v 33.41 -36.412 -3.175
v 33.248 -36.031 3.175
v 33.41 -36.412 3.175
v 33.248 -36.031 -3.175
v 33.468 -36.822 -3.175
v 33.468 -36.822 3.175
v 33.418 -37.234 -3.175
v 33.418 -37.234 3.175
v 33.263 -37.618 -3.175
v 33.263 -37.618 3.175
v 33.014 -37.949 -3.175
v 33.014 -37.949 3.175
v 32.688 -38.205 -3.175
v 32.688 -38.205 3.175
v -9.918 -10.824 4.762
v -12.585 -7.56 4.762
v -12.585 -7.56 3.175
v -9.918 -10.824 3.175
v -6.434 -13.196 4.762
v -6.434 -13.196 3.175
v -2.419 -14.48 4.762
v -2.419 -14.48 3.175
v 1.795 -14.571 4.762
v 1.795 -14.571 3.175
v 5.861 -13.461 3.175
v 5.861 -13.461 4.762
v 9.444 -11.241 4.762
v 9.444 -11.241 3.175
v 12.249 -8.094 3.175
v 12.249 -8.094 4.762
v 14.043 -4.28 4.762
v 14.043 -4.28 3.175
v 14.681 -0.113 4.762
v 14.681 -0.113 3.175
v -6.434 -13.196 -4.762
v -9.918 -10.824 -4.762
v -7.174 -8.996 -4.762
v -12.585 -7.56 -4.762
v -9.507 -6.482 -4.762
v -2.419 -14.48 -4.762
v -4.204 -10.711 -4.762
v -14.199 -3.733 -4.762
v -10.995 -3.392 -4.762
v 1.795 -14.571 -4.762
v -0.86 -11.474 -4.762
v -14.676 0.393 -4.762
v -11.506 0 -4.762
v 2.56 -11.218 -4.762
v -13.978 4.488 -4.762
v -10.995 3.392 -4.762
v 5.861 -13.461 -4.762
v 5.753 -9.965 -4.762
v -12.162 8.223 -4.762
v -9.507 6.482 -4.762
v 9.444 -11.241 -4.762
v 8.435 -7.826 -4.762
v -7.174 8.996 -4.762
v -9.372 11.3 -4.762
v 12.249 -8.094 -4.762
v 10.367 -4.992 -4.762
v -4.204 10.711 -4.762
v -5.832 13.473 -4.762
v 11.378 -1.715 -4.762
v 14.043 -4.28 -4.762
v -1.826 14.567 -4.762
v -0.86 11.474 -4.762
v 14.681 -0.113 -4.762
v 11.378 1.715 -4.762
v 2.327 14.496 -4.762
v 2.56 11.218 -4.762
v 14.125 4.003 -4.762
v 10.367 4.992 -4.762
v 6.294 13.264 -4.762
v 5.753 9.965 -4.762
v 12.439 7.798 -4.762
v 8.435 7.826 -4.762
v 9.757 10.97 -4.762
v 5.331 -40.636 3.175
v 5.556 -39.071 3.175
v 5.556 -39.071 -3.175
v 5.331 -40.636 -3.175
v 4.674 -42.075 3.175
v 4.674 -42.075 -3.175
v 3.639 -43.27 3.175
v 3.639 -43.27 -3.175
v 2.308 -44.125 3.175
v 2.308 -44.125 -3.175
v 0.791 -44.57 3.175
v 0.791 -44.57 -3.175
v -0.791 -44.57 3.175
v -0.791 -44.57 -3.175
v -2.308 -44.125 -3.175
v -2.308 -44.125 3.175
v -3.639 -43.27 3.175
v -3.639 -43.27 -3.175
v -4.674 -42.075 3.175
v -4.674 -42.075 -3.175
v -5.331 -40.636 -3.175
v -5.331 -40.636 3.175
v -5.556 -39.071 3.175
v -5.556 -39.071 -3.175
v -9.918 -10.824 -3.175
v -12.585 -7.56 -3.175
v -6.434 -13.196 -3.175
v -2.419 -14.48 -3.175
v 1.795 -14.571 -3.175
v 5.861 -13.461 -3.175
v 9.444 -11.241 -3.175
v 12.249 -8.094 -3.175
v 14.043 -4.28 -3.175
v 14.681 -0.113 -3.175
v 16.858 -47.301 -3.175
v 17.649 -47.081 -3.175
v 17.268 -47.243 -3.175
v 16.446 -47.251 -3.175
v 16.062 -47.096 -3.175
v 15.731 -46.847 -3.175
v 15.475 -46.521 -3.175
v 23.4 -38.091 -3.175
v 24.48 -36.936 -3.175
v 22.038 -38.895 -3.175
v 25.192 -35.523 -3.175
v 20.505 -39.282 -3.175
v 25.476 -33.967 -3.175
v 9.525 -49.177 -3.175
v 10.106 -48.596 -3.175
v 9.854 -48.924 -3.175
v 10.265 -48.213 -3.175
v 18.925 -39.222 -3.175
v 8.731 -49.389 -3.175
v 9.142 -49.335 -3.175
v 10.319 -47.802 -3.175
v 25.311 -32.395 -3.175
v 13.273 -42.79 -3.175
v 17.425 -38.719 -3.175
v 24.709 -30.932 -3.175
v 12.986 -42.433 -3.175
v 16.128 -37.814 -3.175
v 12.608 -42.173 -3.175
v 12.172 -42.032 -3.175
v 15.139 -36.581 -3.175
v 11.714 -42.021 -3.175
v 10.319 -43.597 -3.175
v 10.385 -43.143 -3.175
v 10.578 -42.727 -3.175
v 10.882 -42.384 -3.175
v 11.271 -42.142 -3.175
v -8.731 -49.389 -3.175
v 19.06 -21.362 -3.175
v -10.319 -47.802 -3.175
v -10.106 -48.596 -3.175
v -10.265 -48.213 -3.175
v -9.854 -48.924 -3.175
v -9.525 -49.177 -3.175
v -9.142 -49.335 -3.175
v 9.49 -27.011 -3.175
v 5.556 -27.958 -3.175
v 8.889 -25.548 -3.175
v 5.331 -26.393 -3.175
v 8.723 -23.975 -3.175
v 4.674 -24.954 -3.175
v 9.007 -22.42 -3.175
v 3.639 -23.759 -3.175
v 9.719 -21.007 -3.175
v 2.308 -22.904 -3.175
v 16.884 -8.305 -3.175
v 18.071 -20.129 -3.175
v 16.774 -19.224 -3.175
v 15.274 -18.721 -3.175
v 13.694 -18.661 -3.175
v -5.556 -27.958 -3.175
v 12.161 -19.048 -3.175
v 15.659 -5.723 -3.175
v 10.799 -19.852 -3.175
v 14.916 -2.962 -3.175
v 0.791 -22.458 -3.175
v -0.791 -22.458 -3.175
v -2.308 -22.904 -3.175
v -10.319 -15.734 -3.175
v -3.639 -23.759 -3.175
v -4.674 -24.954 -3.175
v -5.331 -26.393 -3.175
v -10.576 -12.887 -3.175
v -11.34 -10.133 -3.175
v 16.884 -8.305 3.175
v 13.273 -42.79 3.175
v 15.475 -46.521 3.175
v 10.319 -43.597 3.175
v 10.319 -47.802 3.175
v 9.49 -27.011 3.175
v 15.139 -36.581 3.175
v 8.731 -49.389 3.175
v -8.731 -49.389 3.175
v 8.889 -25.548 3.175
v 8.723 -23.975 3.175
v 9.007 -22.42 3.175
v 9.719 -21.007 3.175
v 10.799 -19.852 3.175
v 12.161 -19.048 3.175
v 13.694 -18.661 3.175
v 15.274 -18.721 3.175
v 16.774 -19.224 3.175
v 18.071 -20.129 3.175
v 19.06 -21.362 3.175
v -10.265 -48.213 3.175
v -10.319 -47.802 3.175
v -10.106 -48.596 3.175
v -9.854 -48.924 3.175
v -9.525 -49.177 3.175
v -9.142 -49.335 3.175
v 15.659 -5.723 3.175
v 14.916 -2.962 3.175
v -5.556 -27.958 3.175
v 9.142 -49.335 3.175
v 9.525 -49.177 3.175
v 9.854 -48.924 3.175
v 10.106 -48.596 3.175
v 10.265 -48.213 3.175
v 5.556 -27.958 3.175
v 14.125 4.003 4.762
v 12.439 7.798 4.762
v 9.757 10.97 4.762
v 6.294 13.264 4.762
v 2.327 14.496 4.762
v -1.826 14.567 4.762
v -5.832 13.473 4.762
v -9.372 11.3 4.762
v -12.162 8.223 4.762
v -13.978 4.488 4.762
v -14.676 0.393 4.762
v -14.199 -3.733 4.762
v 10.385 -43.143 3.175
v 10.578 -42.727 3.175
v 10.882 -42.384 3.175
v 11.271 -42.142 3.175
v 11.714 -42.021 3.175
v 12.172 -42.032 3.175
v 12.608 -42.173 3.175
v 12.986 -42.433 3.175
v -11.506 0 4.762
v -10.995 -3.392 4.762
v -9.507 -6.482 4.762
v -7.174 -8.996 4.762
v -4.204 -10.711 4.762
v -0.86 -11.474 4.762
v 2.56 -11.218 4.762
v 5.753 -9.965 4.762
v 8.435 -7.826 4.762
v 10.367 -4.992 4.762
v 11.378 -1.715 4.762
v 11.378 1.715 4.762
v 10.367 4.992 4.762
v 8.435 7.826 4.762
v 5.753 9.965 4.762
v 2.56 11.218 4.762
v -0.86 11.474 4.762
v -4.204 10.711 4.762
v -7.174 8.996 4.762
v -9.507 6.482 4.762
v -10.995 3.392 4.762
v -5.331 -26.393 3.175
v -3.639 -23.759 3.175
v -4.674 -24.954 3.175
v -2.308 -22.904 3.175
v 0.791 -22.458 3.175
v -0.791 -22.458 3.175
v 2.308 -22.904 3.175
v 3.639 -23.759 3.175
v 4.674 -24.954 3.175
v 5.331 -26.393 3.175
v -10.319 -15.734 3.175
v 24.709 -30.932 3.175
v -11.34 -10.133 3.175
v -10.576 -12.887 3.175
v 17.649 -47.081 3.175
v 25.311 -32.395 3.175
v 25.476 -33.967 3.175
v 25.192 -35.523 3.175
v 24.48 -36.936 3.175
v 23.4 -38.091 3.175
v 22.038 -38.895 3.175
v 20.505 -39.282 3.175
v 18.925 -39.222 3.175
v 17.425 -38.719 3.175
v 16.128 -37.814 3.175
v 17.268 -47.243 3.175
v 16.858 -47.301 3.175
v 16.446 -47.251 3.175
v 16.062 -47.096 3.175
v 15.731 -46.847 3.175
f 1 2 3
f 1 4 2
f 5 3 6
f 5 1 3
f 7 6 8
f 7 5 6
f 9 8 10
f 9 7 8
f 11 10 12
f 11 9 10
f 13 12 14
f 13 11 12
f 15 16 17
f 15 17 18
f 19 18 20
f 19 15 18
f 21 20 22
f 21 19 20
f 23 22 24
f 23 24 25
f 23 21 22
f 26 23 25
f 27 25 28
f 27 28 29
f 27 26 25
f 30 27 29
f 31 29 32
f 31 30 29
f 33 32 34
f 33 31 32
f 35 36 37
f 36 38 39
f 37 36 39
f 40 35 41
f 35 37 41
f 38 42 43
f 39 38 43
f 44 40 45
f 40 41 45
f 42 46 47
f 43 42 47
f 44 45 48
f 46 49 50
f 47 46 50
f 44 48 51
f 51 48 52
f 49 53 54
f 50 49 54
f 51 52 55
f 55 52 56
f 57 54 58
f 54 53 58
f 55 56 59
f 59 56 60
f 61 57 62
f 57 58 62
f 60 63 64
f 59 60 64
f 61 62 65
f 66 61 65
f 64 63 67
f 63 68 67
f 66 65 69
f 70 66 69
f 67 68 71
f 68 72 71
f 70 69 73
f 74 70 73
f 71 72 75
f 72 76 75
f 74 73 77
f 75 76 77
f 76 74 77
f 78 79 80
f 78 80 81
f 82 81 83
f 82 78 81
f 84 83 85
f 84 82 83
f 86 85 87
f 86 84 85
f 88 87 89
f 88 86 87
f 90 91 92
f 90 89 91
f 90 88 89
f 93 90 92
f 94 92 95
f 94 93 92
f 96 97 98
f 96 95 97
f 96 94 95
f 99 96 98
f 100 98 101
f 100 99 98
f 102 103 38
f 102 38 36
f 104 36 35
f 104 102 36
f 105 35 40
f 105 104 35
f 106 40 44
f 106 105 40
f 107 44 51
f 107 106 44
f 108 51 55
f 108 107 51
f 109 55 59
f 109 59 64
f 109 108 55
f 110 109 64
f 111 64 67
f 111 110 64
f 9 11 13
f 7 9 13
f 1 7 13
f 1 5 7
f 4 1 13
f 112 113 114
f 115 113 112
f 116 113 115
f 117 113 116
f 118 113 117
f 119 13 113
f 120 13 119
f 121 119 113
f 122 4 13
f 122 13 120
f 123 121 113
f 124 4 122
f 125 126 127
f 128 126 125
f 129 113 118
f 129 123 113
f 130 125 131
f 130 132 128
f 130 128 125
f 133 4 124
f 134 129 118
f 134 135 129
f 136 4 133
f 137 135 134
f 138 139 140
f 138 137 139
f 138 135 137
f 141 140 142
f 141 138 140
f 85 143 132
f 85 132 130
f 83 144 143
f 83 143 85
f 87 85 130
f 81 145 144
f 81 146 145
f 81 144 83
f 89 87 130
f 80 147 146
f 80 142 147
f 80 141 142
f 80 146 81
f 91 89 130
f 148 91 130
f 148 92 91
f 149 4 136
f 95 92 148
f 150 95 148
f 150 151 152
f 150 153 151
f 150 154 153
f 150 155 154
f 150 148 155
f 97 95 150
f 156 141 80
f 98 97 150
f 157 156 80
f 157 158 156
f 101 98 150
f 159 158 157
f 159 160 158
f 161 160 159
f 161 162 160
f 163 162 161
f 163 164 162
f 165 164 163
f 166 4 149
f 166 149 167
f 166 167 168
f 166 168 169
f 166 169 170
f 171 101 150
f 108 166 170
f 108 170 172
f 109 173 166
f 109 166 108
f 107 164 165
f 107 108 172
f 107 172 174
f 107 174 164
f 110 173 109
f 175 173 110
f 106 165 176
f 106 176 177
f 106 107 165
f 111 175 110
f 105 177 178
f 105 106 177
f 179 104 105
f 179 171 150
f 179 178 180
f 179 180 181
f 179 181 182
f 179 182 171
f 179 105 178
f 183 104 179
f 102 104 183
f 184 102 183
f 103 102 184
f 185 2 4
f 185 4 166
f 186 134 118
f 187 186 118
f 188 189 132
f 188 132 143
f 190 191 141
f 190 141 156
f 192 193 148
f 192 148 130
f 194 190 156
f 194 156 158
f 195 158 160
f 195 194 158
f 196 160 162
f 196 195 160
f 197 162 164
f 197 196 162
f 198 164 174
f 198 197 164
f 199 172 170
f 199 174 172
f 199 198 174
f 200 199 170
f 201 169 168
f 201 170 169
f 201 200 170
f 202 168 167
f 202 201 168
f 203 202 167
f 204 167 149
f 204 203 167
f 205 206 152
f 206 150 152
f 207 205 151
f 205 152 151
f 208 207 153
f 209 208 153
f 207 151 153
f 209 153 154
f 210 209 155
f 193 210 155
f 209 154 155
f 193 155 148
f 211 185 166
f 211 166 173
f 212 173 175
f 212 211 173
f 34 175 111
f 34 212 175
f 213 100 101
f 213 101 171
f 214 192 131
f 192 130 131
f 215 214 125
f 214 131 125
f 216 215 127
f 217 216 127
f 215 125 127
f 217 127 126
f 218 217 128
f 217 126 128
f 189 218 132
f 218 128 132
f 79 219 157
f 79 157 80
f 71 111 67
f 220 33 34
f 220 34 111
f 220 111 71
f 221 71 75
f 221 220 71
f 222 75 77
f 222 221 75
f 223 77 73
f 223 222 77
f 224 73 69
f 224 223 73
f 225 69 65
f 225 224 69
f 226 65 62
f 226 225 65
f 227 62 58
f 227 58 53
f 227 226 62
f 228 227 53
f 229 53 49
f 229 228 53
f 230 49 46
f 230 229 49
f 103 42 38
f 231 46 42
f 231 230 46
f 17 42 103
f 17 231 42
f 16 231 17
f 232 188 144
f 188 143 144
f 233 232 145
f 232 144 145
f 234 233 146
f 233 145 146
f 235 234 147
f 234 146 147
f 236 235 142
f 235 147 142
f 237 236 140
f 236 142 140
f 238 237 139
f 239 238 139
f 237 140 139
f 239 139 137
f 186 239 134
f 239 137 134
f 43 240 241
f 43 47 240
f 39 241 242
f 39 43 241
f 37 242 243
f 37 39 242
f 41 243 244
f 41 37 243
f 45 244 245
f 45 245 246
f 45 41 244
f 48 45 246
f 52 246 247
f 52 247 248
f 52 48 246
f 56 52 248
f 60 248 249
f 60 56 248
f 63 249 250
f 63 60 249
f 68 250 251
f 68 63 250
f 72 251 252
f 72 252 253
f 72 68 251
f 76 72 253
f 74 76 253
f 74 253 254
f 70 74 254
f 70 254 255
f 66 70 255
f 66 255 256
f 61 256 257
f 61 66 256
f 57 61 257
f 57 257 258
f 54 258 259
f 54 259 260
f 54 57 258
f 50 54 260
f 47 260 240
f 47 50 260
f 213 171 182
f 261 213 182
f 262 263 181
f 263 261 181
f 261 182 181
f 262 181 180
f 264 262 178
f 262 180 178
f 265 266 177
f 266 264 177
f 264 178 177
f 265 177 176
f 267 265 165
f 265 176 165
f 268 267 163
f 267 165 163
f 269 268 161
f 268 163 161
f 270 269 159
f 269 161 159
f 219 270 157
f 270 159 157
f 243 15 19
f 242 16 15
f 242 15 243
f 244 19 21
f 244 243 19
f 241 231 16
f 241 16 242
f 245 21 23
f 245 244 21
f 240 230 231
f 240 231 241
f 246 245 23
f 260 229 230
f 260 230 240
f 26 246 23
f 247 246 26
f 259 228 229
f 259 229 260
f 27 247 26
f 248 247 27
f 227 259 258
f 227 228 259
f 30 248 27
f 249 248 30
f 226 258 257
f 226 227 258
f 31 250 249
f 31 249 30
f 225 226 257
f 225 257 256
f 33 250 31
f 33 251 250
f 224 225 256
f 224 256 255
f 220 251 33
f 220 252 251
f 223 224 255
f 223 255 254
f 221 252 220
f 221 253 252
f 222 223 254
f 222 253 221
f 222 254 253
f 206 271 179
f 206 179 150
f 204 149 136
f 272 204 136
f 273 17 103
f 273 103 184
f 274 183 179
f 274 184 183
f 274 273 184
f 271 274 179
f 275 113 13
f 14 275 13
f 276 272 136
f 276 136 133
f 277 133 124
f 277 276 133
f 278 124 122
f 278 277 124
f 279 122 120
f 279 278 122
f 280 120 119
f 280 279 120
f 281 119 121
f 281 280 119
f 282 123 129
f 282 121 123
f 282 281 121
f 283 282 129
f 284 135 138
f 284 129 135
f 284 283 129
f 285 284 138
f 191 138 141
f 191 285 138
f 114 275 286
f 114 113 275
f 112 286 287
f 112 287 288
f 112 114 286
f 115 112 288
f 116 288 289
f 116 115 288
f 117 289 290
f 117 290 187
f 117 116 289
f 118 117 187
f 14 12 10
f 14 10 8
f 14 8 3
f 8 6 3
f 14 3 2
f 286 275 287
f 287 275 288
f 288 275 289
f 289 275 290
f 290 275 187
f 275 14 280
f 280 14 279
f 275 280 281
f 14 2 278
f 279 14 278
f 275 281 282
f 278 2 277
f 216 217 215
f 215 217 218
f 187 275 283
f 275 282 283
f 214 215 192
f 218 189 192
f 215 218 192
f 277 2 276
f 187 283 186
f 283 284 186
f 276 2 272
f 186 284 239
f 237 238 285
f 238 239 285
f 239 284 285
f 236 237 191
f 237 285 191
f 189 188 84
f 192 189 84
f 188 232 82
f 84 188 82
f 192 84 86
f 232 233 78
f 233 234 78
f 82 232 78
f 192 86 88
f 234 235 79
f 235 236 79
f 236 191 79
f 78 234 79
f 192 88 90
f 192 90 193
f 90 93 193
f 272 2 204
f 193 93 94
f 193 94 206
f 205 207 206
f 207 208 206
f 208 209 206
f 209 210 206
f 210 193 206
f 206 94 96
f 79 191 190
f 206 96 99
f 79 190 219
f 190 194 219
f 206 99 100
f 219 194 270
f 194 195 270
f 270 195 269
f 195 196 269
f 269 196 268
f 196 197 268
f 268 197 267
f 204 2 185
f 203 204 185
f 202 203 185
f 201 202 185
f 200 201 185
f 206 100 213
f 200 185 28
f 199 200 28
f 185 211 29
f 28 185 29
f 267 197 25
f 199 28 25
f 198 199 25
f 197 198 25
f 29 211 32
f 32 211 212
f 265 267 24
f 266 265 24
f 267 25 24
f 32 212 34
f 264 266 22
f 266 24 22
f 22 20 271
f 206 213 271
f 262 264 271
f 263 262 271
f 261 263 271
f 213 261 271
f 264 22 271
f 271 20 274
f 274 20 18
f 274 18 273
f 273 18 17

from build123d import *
from build123d.topology import SkipClean

# Parameters (mm, degrees)
SKETCH1_R           = 11.5062
BOSS_EXTRUDE1_DEPTH = 4.7625
CUT_EXTRUDE1_START  = 4.7625
CUT_EXTRUDE1_DEPTH  = 1.5875
CUT_EXTRUDE2_START  = -3.175
CUT_EXTRUDE2_DEPTH  = 1.5875
FILLET1_R           = 1.5875


with BuildPart() as part:
    # Sketch1 → Boss-Extrude1 (new, symmetric)
    # profile 1 of 2: a face of its own
    with BuildSketch(Plane.XY):
        with BuildLine():
            ThreePointArc((-12.585193267, -7.559797873), (-10.89585042, -11.492870345), (-10.31875, -15.734319794))
            Line((-10.31875, -15.734319794), (-10.31875, -49.389319794))
            Line((-10.31875, -49.389319794), (10.31875, -49.389319794))
            Line((10.31875, -49.389319794), (10.31875, -37.783763396))
            Line((10.31875, -37.783763396), (16.282292064, -47.887675791))
            Line((16.282292064, -47.887675791), (34.055016522, -37.397839205))
            Line((34.055016522, -37.397839205), (16.883960941, -8.3052564))
            ThreePointArc((16.883960941, -8.3052564), (15.225065006, -4.359245427), (14.68076155, -0.11346257))
            ThreePointArc((14.68076155, -0.11346257), (3.867793812, -14.162549363), (-12.585193267, -7.559797873))
        make_face()
        with BuildLine():
            ThreePointArc((5.55625, -39.070569794), (0, -44.626819794), (-5.55625, -39.070569794))
            Line((-5.55625, -39.070569794), (-5.55625, -27.958069794))
            ThreePointArc((-5.55625, -27.958069794), (0, -22.401819794), (5.55625, -27.958069794))
            Line((5.55625, -27.958069794), (5.55625, -39.070569794))
        make_face(mode=Mode.SUBTRACT)
        with BuildLine():
            ThreePointArc((24.708700277, -30.932208496), (22.747922773, -38.541359546), (15.138771723, -36.580582042))
            Line((15.138771723, -36.580582042), (9.490398177, -27.010653488))
            ThreePointArc((9.490398177, -27.010653488), (11.451175681, -19.401502438), (19.060326731, -21.362279942))
            Line((19.060326731, -21.362279942), (24.708700277, -30.932208496))
        make_face(mode=Mode.SUBTRACT)
    # profile 2 of 2: a face of its own
    with BuildSketch(Plane.XY):
        with BuildLine():
            ThreePointArc((14.68076155, -0.11346257), (-3.867793812, 14.162549363), (-12.585193267, -7.559797873))
            ThreePointArc((-12.585193267, -7.559797873), (3.867793812, -14.162549363), (14.68076155, -0.11346257))
        make_face()
        with Locations(Location((0, 0, 0), (0, 0, 180))):
            Circle(SKETCH1_R, mode=Mode.SUBTRACT)
    extrude(amount=BOSS_EXTRUDE1_DEPTH, both=True)

    # Sketch3 → Cut-Extrude1 (cut)
    with SkipClean():  # the faces are left unmerged after this step: merging them gives an invalid solid
        with BuildSketch(Plane.XY.offset(CUT_EXTRUDE1_START)):
            with BuildLine():
                ThreePointArc((-12.585193267, -7.559797873), (3.867793812, -14.162549363), (14.68076155, -0.11346257))
                ThreePointArc((14.68076155, -0.11346257), (15.225065006, -4.359245427), (16.883960941, -8.3052564))
                Line((16.883960941, -8.3052564), (34.055016522, -37.397839205))
                Line((34.055016522, -37.397839205), (16.282292064, -47.887675791))
                Line((16.282292064, -47.887675791), (10.31875, -37.783763396))
                Line((10.31875, -37.783763396), (10.31875, -49.389319794))
                Line((10.31875, -49.389319794), (-10.31875, -49.389319794))
                Line((-10.31875, -49.389319794), (-10.31875, -15.734319794))
                ThreePointArc((-10.31875, -15.734319794), (-10.89585042, -11.492870345), (-12.585193267, -7.559797873))
            make_face()
            with BuildLine():
                ThreePointArc((19.060326731, -21.362279942), (11.451175681, -19.401502438), (9.490398177, -27.010653488))
                Line((9.490398177, -27.010653488), (15.138771723, -36.580582042))
                ThreePointArc((15.138771723, -36.580582042), (22.747922773, -38.541359546), (24.708700277, -30.932208496))
                Line((24.708700277, -30.932208496), (19.060326731, -21.362279942))
            make_face(mode=Mode.SUBTRACT)
            with BuildLine():
                ThreePointArc((5.55625, -27.958069794), (0, -22.401819794), (-5.55625, -27.958069794))
                Line((-5.55625, -27.958069794), (-5.55625, -39.070569794))
                ThreePointArc((-5.55625, -39.070569794), (0, -44.626819794), (5.55625, -39.070569794))
                Line((5.55625, -39.070569794), (5.55625, -27.958069794))
            make_face(mode=Mode.SUBTRACT)
        extrude(amount=-CUT_EXTRUDE1_DEPTH, mode=Mode.SUBTRACT)

    # Sketch3<11> → Cut-Extrude2 (cut)
    with SkipClean():  # the faces are left unmerged after this step: merging them gives an invalid solid
        with BuildSketch(Plane.XY.offset(CUT_EXTRUDE2_START)):
            with BuildLine():
                ThreePointArc((-12.585193267, -7.559797873), (3.867793812, -14.162549363), (14.68076155, -0.11346257))
                ThreePointArc((14.68076155, -0.11346257), (15.225065006, -4.359245427), (16.883960941, -8.3052564))
                Line((16.883960941, -8.3052564), (34.055016522, -37.397839205))
                Line((34.055016522, -37.397839205), (16.282292064, -47.887675791))
                Line((16.282292064, -47.887675791), (10.31875, -37.783763396))
                Line((10.31875, -37.783763396), (10.31875, -49.389319794))
                Line((10.31875, -49.389319794), (-10.31875, -49.389319794))
                Line((-10.31875, -49.389319794), (-10.31875, -15.734319794))
                ThreePointArc((-10.31875, -15.734319794), (-10.89585042, -11.492870345), (-12.585193267, -7.559797873))
            make_face()
            with BuildLine():
                ThreePointArc((19.060326731, -21.362279942), (11.451175681, -19.401502438), (9.490398177, -27.010653488))
                Line((9.490398177, -27.010653488), (15.138771723, -36.580582042))
                ThreePointArc((15.138771723, -36.580582042), (22.747922773, -38.541359546), (24.708700277, -30.932208496))
                Line((24.708700277, -30.932208496), (19.060326731, -21.362279942))
            make_face(mode=Mode.SUBTRACT)
            with BuildLine():
                ThreePointArc((5.55625, -27.958069794), (0, -22.401819794), (-5.55625, -27.958069794))
                Line((-5.55625, -27.958069794), (-5.55625, -39.070569794))
                ThreePointArc((-5.55625, -39.070569794), (0, -44.626819794), (5.55625, -39.070569794))
                Line((5.55625, -39.070569794), (5.55625, -27.958069794))
            make_face(mode=Mode.SUBTRACT)
        extrude(amount=-CUT_EXTRUDE2_DEPTH, mode=Mode.SUBTRACT)

    # Fillet1
    fillet1_edges = [part.edges().sort_by_distance(p)[0] for p in [
        (34.055016522, -37.397839205, 0),
        (16.282292064, -47.887675791, 0),
        (10.31875, -37.783763396, 0),
        (10.31875, -49.389319794, 0),
        (-10.31875, -49.389319794, 0),
    ]]
    fillet(fillet1_edges, radius=FILLET1_R)


solid = part.part
